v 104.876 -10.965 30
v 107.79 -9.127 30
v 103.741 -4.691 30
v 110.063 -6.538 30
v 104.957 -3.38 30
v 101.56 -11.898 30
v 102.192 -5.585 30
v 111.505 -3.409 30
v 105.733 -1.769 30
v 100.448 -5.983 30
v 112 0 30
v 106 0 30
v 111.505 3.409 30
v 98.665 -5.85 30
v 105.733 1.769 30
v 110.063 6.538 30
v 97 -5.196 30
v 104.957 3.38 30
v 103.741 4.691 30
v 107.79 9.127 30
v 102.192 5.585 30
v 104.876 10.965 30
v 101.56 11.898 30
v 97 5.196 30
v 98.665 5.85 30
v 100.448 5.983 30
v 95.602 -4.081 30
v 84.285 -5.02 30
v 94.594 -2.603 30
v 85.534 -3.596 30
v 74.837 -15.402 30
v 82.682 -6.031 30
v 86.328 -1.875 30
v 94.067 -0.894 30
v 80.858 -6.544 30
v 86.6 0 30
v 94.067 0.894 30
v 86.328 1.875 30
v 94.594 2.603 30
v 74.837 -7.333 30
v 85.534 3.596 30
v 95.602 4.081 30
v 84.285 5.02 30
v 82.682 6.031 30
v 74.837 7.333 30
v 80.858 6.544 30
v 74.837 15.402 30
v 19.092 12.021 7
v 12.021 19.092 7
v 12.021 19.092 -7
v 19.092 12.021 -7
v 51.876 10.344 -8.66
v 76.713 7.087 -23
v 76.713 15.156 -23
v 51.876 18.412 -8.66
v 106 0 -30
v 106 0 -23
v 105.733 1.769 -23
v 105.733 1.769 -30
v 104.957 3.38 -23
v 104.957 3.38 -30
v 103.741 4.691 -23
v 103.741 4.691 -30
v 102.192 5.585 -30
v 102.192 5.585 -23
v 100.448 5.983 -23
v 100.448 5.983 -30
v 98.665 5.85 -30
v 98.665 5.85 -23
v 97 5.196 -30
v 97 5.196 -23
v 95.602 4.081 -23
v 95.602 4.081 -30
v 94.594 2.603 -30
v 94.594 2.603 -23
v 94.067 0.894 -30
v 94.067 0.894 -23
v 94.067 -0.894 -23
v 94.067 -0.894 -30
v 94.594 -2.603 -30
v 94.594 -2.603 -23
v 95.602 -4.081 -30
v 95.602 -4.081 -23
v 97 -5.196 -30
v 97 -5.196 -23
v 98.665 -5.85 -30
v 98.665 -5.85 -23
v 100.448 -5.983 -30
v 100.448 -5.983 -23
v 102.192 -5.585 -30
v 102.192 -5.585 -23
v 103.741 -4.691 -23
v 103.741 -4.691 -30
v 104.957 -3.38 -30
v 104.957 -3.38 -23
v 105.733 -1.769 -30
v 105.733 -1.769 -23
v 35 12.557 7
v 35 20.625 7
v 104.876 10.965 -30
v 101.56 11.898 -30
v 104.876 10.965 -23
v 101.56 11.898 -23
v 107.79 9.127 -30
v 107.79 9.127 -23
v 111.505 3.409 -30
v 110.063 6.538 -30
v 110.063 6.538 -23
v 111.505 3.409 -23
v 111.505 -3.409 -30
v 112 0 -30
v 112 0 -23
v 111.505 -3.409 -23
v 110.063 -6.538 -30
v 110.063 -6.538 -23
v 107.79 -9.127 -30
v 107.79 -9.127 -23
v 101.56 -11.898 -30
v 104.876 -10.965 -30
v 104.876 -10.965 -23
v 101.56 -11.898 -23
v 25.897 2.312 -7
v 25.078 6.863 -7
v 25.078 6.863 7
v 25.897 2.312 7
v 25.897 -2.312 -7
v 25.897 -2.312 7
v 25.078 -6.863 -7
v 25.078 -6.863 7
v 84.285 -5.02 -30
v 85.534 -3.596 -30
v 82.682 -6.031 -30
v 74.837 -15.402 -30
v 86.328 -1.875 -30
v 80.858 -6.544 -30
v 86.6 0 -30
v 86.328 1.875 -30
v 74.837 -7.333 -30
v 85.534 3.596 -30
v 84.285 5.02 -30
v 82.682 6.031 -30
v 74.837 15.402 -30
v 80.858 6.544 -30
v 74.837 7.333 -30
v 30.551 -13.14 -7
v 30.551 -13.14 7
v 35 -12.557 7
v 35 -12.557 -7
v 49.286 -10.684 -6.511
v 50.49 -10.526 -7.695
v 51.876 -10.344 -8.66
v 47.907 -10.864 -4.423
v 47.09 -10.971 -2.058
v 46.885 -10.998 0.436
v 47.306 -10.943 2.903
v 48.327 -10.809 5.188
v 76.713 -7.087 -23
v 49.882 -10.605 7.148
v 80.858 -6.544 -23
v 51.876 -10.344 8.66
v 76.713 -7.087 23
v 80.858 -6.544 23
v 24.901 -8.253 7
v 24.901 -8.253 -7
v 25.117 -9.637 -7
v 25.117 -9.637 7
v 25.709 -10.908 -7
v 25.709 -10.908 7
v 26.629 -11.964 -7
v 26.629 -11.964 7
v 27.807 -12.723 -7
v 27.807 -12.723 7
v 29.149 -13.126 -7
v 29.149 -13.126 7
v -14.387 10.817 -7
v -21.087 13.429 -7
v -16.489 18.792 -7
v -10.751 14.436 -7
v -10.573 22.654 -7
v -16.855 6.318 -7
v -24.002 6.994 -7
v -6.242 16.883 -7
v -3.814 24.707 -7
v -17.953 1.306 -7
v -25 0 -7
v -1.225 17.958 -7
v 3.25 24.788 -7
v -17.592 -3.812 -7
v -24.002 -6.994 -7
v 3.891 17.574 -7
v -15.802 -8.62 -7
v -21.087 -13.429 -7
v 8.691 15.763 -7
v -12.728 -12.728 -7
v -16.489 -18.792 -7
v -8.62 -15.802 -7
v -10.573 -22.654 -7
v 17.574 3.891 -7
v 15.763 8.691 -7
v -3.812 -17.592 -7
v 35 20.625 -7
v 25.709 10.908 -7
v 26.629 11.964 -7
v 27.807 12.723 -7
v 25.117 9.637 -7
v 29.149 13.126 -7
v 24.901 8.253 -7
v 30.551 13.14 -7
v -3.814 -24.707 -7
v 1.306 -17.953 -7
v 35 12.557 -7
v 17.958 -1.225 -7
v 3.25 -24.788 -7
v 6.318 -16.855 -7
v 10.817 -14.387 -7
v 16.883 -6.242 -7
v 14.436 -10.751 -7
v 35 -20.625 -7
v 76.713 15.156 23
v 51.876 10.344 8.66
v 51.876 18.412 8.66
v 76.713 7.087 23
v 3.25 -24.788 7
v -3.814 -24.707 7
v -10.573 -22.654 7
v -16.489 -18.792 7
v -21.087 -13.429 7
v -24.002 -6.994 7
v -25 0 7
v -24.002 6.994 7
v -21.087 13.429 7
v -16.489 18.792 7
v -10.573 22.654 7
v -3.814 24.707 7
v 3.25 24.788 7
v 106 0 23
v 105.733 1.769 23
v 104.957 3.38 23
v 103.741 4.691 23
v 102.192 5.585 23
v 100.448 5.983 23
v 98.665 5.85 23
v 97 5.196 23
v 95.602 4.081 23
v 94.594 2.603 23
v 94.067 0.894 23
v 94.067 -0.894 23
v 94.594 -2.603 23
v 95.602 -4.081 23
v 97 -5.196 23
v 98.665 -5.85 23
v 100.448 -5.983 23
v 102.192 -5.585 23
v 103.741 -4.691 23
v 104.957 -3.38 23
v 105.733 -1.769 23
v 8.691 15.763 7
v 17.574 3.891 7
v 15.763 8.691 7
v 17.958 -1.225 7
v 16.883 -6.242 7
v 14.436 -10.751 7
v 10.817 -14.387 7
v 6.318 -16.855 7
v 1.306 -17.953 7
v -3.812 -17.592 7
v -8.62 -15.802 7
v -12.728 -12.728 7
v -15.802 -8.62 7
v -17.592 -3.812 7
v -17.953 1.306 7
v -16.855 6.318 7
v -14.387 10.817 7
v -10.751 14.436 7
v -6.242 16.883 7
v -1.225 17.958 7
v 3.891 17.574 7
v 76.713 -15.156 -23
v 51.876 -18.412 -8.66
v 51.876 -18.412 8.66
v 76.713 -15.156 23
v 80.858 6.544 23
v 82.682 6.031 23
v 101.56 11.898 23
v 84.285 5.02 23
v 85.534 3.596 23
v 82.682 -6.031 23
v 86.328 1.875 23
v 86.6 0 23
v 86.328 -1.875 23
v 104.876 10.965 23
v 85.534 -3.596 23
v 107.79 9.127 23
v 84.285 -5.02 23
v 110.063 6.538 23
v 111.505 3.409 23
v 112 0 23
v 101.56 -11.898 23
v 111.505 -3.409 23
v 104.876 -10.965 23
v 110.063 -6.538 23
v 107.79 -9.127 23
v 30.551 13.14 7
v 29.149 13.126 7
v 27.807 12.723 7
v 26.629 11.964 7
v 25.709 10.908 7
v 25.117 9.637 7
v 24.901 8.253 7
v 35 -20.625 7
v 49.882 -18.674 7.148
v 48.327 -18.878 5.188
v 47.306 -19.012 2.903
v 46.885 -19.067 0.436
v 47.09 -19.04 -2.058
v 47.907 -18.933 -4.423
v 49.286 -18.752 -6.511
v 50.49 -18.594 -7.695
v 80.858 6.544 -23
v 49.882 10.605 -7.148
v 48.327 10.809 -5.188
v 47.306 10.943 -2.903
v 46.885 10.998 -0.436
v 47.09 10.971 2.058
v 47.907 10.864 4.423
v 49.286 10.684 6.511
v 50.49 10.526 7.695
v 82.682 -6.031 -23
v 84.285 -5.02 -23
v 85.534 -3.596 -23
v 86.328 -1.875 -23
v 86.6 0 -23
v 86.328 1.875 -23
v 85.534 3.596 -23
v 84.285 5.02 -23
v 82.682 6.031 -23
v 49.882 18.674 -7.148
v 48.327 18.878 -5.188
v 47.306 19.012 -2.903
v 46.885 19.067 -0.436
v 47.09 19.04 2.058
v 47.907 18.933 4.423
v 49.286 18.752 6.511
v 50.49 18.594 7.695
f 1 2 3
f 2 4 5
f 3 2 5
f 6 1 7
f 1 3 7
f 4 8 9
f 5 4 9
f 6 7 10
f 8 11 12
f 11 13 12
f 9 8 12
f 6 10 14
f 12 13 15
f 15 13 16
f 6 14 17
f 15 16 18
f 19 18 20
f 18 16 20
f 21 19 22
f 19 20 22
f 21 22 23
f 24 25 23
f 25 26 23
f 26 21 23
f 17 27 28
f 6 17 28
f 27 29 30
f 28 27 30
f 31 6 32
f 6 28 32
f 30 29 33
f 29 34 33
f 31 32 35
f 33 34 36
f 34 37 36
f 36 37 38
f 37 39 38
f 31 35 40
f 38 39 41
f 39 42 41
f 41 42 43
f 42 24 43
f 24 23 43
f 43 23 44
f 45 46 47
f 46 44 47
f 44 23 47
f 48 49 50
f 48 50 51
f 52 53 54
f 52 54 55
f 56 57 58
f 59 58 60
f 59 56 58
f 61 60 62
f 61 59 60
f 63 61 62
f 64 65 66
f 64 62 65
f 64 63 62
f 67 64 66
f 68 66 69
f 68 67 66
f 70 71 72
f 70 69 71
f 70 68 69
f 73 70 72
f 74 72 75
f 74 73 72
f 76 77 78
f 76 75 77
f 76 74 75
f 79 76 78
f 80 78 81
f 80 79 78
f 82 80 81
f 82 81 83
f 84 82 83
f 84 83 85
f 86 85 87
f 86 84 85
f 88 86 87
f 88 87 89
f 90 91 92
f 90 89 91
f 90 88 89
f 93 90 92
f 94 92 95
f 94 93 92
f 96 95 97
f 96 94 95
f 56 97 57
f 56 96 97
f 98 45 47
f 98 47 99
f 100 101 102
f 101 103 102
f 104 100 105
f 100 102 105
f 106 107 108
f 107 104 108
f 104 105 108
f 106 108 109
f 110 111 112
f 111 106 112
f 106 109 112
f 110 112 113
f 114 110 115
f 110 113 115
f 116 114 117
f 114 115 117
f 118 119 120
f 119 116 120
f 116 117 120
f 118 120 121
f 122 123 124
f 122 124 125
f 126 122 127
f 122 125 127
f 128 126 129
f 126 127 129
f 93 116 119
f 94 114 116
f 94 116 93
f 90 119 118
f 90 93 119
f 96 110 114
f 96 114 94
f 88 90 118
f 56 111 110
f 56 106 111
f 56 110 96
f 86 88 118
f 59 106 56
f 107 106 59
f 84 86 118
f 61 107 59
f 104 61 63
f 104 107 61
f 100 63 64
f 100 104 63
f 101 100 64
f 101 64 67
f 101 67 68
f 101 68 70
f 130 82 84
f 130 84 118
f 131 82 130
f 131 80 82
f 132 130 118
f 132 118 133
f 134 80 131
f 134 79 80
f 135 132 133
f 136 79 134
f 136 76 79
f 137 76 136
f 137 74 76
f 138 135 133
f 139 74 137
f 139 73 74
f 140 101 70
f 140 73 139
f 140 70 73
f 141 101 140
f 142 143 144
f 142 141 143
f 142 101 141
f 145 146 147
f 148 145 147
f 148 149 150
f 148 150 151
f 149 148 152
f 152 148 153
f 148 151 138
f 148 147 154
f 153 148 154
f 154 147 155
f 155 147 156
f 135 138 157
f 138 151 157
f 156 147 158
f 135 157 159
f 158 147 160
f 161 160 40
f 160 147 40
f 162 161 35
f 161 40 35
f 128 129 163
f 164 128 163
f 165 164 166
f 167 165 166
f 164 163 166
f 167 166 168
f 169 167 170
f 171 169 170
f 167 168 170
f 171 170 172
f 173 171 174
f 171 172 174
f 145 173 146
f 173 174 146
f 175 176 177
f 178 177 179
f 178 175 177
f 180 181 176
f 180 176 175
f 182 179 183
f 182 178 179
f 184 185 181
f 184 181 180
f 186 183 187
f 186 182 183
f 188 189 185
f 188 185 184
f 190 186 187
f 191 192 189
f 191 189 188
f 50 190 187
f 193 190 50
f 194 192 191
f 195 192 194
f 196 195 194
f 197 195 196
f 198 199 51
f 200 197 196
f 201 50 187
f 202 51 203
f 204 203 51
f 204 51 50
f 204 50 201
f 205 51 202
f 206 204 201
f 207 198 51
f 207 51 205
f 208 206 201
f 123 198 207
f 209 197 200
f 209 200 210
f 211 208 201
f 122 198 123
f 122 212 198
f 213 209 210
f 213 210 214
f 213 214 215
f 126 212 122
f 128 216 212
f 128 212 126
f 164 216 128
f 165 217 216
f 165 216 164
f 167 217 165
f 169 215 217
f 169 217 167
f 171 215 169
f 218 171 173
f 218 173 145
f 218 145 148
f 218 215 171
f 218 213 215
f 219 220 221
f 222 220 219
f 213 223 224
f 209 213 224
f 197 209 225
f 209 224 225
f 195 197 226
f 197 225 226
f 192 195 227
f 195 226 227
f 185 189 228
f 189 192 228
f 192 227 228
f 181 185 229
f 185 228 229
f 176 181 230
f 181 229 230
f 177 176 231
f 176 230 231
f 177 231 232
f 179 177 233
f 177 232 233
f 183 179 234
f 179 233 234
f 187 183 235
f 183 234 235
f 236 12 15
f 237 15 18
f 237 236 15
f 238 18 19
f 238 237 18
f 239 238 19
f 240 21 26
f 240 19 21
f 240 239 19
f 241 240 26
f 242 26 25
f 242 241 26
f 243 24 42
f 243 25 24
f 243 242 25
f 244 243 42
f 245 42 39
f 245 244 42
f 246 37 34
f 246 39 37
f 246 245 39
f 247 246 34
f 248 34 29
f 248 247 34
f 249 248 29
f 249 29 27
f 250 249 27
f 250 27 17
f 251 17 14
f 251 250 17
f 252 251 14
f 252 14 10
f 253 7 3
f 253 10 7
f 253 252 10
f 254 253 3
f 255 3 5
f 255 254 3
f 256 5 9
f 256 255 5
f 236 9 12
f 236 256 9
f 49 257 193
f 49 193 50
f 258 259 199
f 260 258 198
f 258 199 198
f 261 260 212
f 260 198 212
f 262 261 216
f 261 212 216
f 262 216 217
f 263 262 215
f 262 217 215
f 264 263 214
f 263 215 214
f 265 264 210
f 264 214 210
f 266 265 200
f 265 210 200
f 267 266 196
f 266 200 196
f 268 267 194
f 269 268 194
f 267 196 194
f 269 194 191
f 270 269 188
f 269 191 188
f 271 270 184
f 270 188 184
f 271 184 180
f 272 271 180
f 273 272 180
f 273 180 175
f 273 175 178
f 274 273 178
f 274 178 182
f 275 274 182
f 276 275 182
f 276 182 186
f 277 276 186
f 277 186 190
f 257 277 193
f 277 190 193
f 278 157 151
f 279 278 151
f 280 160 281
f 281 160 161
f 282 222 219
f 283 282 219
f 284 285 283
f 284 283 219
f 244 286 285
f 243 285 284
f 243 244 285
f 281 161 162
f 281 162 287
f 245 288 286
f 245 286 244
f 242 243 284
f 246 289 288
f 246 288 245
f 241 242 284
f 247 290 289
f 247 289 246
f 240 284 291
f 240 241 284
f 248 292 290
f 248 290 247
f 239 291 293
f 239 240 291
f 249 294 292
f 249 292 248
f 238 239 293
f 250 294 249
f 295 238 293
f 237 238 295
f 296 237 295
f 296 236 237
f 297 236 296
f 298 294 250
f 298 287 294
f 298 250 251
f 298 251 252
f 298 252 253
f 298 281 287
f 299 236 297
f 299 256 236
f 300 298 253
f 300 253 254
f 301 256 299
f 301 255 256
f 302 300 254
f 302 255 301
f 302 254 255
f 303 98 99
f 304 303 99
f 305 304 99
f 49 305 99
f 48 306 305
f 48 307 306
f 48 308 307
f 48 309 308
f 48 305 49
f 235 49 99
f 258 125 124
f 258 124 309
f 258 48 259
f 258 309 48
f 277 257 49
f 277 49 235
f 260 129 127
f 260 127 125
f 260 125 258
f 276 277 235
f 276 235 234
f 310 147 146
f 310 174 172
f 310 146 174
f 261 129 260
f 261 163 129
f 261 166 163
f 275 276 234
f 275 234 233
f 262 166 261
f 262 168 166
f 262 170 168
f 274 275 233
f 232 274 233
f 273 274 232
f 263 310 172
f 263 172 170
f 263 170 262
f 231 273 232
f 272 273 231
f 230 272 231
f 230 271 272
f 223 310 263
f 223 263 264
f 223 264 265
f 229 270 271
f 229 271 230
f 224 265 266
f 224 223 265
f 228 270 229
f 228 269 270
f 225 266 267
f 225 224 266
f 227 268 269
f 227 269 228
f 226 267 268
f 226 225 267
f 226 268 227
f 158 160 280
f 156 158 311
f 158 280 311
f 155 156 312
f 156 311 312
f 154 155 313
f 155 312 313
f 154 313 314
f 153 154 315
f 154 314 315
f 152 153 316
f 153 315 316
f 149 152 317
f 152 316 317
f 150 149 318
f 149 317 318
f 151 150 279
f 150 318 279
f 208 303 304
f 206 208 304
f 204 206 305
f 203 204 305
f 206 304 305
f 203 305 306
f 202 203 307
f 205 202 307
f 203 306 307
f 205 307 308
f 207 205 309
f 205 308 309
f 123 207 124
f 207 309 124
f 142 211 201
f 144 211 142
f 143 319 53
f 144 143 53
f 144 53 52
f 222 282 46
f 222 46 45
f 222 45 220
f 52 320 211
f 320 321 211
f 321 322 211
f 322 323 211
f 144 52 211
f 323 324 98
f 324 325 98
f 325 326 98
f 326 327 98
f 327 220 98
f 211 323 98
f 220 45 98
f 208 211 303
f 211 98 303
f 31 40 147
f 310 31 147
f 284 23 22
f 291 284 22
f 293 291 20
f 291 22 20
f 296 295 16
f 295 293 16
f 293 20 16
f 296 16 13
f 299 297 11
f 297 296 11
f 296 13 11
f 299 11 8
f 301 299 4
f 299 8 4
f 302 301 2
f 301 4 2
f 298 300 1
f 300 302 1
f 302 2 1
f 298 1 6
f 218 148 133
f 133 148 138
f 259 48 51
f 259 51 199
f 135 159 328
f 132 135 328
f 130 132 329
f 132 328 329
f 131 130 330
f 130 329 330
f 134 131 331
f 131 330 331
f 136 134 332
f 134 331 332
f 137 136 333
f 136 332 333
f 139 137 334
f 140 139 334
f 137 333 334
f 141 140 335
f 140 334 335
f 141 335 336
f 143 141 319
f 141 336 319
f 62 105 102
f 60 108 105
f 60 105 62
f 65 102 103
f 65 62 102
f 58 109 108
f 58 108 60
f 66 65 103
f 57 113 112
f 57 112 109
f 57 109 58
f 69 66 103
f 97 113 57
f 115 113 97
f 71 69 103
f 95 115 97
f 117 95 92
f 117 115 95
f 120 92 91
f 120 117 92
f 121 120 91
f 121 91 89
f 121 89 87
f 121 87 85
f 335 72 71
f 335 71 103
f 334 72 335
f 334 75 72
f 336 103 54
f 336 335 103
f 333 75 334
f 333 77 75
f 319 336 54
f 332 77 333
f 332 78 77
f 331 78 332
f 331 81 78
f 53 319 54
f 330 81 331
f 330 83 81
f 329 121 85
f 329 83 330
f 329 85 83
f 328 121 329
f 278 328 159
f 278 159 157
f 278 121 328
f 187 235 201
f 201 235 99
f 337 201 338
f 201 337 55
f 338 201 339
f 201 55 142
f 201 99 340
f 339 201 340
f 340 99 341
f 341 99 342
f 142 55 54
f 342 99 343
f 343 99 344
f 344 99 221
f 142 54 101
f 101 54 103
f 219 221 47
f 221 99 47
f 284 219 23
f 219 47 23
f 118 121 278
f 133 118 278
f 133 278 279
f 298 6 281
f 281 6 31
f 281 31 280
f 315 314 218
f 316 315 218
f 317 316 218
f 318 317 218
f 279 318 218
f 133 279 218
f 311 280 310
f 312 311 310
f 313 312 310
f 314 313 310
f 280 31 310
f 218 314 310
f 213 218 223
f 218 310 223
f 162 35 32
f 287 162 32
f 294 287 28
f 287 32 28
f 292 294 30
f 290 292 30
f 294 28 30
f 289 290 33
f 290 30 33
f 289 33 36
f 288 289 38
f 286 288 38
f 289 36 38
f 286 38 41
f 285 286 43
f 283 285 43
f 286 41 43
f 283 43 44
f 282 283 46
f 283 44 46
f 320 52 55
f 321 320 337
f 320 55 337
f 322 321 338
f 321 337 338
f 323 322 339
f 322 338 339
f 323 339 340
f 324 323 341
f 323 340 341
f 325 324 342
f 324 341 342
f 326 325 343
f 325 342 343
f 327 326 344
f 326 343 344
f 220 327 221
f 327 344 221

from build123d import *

# Parameters (mm, degrees)
SKETCH1_R               = 6
BOSS_EXTRUDE1_DEPTH     = 30
CUT_EXTRUDE1_DEPTH      = 61
SKETCH3_OUTSIDE_W       = 170.54
SKETCH3_OUTSIDE_H       = 93.54
CUT_EXTRUDE2_DEPTH      = 26
CUT_EXTRUDE2_DEPTH_BACK = 26
FILLET1_R               = 10


with BuildPart() as part:
    # Sketch1 → Boss-Extrude1 (new body, symmetric)
    with BuildSketch(Plane.XY):
        with BuildLine():
            Line((3.25, 24.787849846), (101.56, 11.898167926))
            ThreePointArc((101.56, 11.898167926), (112, 0), (101.56, -11.898167926))
            Line((101.56, -11.898167926), (3.25, -24.787849846))
            ThreePointArc((3.25, -24.787849846), (-25, 0), (3.25, 24.787849846))
        make_face()
        with Locations((100, 0)):
            Circle(SKETCH1_R, mode=Mode.SUBTRACT)
        with BuildLine():
            Line((8.691485355, 15.762553167), (12.02081528, 19.091883092))
            Line((12.02081528, 19.091883092), (19.091883092, 12.02081528))
            Line((19.091883092, 12.02081528), (15.762553167, 8.691485355))
            ThreePointArc((15.762553167, 8.691485355), (-12.727922061, -12.727922061), (8.691485355, 15.762553167))
        make_face(mode=Mode.SUBTRACT)
    extrude(amount=BOSS_EXTRUDE1_DEPTH, both=True)

    # Sketch2 → Cut-Extrude1 (cut, through all)
    with BuildSketch(Plane.XY.offset(30)):
        with BuildLine():
            Line((80.858, 6.543992359), (30.550654544, 13.139920354))
            ThreePointArc((30.550654544, 13.139920354), (26.131839925, 11.468082627), (25.077968327, 6.862616452))
            ThreePointArc((25.077968327, 6.862616452), (26, 0), (25.077968327, -6.862616452))
            ThreePointArc((25.077968327, -6.862616452), (26.131839925, -11.468082627), (30.550654544, -13.139920354))
            Line((30.550654544, -13.139920354), (80.858, -6.543992359))
            ThreePointArc((80.858, -6.543992359), (86.6, 0), (80.858, 6.543992359))
        make_face()
    extrude(amount=-CUT_EXTRUDE1_DEPTH, mode=Mode.SUBTRACT)

    # Sketch3 outside → Cut-Extrude2 (cut, two sides)
    with BuildSketch(Plane(origin=(0, 0, 0), x_dir=(1, 0, 0), z_dir=(0, 1, 0))) as cut_extrude2_sk:
        with Locations((43.5, 0)):
            Rectangle(SKETCH3_OUTSIDE_W, SKETCH3_OUTSIDE_H)
        Polygon((-25, 7), (35, 7), (74.837168574, 30), (112, 30), (112, 23), (76.712812921, 23), (36.875644347, 0), (76.712812921, -23), (112, -23), (112, -30), (74.837168574, -30), (35, -7), (-25, -7), align=None, mode=Mode.SUBTRACT)
    extrude(amount=CUT_EXTRUDE2_DEPTH, mode=Mode.SUBTRACT)
    extrude(cut_extrude2_sk.sketch, amount=-CUT_EXTRUDE2_DEPTH_BACK, mode=Mode.SUBTRACT)

    # Fillet1
    fillet1_edges = [part.edges().sort_by_distance(p)[0] for p in [
        (36.875644347, -16.344868893, 0),
        (36.875644347, 16.344868893, 0),
    ]]
    fillet(fillet1_edges, radius=FILLET1_R)


solid = part.part
